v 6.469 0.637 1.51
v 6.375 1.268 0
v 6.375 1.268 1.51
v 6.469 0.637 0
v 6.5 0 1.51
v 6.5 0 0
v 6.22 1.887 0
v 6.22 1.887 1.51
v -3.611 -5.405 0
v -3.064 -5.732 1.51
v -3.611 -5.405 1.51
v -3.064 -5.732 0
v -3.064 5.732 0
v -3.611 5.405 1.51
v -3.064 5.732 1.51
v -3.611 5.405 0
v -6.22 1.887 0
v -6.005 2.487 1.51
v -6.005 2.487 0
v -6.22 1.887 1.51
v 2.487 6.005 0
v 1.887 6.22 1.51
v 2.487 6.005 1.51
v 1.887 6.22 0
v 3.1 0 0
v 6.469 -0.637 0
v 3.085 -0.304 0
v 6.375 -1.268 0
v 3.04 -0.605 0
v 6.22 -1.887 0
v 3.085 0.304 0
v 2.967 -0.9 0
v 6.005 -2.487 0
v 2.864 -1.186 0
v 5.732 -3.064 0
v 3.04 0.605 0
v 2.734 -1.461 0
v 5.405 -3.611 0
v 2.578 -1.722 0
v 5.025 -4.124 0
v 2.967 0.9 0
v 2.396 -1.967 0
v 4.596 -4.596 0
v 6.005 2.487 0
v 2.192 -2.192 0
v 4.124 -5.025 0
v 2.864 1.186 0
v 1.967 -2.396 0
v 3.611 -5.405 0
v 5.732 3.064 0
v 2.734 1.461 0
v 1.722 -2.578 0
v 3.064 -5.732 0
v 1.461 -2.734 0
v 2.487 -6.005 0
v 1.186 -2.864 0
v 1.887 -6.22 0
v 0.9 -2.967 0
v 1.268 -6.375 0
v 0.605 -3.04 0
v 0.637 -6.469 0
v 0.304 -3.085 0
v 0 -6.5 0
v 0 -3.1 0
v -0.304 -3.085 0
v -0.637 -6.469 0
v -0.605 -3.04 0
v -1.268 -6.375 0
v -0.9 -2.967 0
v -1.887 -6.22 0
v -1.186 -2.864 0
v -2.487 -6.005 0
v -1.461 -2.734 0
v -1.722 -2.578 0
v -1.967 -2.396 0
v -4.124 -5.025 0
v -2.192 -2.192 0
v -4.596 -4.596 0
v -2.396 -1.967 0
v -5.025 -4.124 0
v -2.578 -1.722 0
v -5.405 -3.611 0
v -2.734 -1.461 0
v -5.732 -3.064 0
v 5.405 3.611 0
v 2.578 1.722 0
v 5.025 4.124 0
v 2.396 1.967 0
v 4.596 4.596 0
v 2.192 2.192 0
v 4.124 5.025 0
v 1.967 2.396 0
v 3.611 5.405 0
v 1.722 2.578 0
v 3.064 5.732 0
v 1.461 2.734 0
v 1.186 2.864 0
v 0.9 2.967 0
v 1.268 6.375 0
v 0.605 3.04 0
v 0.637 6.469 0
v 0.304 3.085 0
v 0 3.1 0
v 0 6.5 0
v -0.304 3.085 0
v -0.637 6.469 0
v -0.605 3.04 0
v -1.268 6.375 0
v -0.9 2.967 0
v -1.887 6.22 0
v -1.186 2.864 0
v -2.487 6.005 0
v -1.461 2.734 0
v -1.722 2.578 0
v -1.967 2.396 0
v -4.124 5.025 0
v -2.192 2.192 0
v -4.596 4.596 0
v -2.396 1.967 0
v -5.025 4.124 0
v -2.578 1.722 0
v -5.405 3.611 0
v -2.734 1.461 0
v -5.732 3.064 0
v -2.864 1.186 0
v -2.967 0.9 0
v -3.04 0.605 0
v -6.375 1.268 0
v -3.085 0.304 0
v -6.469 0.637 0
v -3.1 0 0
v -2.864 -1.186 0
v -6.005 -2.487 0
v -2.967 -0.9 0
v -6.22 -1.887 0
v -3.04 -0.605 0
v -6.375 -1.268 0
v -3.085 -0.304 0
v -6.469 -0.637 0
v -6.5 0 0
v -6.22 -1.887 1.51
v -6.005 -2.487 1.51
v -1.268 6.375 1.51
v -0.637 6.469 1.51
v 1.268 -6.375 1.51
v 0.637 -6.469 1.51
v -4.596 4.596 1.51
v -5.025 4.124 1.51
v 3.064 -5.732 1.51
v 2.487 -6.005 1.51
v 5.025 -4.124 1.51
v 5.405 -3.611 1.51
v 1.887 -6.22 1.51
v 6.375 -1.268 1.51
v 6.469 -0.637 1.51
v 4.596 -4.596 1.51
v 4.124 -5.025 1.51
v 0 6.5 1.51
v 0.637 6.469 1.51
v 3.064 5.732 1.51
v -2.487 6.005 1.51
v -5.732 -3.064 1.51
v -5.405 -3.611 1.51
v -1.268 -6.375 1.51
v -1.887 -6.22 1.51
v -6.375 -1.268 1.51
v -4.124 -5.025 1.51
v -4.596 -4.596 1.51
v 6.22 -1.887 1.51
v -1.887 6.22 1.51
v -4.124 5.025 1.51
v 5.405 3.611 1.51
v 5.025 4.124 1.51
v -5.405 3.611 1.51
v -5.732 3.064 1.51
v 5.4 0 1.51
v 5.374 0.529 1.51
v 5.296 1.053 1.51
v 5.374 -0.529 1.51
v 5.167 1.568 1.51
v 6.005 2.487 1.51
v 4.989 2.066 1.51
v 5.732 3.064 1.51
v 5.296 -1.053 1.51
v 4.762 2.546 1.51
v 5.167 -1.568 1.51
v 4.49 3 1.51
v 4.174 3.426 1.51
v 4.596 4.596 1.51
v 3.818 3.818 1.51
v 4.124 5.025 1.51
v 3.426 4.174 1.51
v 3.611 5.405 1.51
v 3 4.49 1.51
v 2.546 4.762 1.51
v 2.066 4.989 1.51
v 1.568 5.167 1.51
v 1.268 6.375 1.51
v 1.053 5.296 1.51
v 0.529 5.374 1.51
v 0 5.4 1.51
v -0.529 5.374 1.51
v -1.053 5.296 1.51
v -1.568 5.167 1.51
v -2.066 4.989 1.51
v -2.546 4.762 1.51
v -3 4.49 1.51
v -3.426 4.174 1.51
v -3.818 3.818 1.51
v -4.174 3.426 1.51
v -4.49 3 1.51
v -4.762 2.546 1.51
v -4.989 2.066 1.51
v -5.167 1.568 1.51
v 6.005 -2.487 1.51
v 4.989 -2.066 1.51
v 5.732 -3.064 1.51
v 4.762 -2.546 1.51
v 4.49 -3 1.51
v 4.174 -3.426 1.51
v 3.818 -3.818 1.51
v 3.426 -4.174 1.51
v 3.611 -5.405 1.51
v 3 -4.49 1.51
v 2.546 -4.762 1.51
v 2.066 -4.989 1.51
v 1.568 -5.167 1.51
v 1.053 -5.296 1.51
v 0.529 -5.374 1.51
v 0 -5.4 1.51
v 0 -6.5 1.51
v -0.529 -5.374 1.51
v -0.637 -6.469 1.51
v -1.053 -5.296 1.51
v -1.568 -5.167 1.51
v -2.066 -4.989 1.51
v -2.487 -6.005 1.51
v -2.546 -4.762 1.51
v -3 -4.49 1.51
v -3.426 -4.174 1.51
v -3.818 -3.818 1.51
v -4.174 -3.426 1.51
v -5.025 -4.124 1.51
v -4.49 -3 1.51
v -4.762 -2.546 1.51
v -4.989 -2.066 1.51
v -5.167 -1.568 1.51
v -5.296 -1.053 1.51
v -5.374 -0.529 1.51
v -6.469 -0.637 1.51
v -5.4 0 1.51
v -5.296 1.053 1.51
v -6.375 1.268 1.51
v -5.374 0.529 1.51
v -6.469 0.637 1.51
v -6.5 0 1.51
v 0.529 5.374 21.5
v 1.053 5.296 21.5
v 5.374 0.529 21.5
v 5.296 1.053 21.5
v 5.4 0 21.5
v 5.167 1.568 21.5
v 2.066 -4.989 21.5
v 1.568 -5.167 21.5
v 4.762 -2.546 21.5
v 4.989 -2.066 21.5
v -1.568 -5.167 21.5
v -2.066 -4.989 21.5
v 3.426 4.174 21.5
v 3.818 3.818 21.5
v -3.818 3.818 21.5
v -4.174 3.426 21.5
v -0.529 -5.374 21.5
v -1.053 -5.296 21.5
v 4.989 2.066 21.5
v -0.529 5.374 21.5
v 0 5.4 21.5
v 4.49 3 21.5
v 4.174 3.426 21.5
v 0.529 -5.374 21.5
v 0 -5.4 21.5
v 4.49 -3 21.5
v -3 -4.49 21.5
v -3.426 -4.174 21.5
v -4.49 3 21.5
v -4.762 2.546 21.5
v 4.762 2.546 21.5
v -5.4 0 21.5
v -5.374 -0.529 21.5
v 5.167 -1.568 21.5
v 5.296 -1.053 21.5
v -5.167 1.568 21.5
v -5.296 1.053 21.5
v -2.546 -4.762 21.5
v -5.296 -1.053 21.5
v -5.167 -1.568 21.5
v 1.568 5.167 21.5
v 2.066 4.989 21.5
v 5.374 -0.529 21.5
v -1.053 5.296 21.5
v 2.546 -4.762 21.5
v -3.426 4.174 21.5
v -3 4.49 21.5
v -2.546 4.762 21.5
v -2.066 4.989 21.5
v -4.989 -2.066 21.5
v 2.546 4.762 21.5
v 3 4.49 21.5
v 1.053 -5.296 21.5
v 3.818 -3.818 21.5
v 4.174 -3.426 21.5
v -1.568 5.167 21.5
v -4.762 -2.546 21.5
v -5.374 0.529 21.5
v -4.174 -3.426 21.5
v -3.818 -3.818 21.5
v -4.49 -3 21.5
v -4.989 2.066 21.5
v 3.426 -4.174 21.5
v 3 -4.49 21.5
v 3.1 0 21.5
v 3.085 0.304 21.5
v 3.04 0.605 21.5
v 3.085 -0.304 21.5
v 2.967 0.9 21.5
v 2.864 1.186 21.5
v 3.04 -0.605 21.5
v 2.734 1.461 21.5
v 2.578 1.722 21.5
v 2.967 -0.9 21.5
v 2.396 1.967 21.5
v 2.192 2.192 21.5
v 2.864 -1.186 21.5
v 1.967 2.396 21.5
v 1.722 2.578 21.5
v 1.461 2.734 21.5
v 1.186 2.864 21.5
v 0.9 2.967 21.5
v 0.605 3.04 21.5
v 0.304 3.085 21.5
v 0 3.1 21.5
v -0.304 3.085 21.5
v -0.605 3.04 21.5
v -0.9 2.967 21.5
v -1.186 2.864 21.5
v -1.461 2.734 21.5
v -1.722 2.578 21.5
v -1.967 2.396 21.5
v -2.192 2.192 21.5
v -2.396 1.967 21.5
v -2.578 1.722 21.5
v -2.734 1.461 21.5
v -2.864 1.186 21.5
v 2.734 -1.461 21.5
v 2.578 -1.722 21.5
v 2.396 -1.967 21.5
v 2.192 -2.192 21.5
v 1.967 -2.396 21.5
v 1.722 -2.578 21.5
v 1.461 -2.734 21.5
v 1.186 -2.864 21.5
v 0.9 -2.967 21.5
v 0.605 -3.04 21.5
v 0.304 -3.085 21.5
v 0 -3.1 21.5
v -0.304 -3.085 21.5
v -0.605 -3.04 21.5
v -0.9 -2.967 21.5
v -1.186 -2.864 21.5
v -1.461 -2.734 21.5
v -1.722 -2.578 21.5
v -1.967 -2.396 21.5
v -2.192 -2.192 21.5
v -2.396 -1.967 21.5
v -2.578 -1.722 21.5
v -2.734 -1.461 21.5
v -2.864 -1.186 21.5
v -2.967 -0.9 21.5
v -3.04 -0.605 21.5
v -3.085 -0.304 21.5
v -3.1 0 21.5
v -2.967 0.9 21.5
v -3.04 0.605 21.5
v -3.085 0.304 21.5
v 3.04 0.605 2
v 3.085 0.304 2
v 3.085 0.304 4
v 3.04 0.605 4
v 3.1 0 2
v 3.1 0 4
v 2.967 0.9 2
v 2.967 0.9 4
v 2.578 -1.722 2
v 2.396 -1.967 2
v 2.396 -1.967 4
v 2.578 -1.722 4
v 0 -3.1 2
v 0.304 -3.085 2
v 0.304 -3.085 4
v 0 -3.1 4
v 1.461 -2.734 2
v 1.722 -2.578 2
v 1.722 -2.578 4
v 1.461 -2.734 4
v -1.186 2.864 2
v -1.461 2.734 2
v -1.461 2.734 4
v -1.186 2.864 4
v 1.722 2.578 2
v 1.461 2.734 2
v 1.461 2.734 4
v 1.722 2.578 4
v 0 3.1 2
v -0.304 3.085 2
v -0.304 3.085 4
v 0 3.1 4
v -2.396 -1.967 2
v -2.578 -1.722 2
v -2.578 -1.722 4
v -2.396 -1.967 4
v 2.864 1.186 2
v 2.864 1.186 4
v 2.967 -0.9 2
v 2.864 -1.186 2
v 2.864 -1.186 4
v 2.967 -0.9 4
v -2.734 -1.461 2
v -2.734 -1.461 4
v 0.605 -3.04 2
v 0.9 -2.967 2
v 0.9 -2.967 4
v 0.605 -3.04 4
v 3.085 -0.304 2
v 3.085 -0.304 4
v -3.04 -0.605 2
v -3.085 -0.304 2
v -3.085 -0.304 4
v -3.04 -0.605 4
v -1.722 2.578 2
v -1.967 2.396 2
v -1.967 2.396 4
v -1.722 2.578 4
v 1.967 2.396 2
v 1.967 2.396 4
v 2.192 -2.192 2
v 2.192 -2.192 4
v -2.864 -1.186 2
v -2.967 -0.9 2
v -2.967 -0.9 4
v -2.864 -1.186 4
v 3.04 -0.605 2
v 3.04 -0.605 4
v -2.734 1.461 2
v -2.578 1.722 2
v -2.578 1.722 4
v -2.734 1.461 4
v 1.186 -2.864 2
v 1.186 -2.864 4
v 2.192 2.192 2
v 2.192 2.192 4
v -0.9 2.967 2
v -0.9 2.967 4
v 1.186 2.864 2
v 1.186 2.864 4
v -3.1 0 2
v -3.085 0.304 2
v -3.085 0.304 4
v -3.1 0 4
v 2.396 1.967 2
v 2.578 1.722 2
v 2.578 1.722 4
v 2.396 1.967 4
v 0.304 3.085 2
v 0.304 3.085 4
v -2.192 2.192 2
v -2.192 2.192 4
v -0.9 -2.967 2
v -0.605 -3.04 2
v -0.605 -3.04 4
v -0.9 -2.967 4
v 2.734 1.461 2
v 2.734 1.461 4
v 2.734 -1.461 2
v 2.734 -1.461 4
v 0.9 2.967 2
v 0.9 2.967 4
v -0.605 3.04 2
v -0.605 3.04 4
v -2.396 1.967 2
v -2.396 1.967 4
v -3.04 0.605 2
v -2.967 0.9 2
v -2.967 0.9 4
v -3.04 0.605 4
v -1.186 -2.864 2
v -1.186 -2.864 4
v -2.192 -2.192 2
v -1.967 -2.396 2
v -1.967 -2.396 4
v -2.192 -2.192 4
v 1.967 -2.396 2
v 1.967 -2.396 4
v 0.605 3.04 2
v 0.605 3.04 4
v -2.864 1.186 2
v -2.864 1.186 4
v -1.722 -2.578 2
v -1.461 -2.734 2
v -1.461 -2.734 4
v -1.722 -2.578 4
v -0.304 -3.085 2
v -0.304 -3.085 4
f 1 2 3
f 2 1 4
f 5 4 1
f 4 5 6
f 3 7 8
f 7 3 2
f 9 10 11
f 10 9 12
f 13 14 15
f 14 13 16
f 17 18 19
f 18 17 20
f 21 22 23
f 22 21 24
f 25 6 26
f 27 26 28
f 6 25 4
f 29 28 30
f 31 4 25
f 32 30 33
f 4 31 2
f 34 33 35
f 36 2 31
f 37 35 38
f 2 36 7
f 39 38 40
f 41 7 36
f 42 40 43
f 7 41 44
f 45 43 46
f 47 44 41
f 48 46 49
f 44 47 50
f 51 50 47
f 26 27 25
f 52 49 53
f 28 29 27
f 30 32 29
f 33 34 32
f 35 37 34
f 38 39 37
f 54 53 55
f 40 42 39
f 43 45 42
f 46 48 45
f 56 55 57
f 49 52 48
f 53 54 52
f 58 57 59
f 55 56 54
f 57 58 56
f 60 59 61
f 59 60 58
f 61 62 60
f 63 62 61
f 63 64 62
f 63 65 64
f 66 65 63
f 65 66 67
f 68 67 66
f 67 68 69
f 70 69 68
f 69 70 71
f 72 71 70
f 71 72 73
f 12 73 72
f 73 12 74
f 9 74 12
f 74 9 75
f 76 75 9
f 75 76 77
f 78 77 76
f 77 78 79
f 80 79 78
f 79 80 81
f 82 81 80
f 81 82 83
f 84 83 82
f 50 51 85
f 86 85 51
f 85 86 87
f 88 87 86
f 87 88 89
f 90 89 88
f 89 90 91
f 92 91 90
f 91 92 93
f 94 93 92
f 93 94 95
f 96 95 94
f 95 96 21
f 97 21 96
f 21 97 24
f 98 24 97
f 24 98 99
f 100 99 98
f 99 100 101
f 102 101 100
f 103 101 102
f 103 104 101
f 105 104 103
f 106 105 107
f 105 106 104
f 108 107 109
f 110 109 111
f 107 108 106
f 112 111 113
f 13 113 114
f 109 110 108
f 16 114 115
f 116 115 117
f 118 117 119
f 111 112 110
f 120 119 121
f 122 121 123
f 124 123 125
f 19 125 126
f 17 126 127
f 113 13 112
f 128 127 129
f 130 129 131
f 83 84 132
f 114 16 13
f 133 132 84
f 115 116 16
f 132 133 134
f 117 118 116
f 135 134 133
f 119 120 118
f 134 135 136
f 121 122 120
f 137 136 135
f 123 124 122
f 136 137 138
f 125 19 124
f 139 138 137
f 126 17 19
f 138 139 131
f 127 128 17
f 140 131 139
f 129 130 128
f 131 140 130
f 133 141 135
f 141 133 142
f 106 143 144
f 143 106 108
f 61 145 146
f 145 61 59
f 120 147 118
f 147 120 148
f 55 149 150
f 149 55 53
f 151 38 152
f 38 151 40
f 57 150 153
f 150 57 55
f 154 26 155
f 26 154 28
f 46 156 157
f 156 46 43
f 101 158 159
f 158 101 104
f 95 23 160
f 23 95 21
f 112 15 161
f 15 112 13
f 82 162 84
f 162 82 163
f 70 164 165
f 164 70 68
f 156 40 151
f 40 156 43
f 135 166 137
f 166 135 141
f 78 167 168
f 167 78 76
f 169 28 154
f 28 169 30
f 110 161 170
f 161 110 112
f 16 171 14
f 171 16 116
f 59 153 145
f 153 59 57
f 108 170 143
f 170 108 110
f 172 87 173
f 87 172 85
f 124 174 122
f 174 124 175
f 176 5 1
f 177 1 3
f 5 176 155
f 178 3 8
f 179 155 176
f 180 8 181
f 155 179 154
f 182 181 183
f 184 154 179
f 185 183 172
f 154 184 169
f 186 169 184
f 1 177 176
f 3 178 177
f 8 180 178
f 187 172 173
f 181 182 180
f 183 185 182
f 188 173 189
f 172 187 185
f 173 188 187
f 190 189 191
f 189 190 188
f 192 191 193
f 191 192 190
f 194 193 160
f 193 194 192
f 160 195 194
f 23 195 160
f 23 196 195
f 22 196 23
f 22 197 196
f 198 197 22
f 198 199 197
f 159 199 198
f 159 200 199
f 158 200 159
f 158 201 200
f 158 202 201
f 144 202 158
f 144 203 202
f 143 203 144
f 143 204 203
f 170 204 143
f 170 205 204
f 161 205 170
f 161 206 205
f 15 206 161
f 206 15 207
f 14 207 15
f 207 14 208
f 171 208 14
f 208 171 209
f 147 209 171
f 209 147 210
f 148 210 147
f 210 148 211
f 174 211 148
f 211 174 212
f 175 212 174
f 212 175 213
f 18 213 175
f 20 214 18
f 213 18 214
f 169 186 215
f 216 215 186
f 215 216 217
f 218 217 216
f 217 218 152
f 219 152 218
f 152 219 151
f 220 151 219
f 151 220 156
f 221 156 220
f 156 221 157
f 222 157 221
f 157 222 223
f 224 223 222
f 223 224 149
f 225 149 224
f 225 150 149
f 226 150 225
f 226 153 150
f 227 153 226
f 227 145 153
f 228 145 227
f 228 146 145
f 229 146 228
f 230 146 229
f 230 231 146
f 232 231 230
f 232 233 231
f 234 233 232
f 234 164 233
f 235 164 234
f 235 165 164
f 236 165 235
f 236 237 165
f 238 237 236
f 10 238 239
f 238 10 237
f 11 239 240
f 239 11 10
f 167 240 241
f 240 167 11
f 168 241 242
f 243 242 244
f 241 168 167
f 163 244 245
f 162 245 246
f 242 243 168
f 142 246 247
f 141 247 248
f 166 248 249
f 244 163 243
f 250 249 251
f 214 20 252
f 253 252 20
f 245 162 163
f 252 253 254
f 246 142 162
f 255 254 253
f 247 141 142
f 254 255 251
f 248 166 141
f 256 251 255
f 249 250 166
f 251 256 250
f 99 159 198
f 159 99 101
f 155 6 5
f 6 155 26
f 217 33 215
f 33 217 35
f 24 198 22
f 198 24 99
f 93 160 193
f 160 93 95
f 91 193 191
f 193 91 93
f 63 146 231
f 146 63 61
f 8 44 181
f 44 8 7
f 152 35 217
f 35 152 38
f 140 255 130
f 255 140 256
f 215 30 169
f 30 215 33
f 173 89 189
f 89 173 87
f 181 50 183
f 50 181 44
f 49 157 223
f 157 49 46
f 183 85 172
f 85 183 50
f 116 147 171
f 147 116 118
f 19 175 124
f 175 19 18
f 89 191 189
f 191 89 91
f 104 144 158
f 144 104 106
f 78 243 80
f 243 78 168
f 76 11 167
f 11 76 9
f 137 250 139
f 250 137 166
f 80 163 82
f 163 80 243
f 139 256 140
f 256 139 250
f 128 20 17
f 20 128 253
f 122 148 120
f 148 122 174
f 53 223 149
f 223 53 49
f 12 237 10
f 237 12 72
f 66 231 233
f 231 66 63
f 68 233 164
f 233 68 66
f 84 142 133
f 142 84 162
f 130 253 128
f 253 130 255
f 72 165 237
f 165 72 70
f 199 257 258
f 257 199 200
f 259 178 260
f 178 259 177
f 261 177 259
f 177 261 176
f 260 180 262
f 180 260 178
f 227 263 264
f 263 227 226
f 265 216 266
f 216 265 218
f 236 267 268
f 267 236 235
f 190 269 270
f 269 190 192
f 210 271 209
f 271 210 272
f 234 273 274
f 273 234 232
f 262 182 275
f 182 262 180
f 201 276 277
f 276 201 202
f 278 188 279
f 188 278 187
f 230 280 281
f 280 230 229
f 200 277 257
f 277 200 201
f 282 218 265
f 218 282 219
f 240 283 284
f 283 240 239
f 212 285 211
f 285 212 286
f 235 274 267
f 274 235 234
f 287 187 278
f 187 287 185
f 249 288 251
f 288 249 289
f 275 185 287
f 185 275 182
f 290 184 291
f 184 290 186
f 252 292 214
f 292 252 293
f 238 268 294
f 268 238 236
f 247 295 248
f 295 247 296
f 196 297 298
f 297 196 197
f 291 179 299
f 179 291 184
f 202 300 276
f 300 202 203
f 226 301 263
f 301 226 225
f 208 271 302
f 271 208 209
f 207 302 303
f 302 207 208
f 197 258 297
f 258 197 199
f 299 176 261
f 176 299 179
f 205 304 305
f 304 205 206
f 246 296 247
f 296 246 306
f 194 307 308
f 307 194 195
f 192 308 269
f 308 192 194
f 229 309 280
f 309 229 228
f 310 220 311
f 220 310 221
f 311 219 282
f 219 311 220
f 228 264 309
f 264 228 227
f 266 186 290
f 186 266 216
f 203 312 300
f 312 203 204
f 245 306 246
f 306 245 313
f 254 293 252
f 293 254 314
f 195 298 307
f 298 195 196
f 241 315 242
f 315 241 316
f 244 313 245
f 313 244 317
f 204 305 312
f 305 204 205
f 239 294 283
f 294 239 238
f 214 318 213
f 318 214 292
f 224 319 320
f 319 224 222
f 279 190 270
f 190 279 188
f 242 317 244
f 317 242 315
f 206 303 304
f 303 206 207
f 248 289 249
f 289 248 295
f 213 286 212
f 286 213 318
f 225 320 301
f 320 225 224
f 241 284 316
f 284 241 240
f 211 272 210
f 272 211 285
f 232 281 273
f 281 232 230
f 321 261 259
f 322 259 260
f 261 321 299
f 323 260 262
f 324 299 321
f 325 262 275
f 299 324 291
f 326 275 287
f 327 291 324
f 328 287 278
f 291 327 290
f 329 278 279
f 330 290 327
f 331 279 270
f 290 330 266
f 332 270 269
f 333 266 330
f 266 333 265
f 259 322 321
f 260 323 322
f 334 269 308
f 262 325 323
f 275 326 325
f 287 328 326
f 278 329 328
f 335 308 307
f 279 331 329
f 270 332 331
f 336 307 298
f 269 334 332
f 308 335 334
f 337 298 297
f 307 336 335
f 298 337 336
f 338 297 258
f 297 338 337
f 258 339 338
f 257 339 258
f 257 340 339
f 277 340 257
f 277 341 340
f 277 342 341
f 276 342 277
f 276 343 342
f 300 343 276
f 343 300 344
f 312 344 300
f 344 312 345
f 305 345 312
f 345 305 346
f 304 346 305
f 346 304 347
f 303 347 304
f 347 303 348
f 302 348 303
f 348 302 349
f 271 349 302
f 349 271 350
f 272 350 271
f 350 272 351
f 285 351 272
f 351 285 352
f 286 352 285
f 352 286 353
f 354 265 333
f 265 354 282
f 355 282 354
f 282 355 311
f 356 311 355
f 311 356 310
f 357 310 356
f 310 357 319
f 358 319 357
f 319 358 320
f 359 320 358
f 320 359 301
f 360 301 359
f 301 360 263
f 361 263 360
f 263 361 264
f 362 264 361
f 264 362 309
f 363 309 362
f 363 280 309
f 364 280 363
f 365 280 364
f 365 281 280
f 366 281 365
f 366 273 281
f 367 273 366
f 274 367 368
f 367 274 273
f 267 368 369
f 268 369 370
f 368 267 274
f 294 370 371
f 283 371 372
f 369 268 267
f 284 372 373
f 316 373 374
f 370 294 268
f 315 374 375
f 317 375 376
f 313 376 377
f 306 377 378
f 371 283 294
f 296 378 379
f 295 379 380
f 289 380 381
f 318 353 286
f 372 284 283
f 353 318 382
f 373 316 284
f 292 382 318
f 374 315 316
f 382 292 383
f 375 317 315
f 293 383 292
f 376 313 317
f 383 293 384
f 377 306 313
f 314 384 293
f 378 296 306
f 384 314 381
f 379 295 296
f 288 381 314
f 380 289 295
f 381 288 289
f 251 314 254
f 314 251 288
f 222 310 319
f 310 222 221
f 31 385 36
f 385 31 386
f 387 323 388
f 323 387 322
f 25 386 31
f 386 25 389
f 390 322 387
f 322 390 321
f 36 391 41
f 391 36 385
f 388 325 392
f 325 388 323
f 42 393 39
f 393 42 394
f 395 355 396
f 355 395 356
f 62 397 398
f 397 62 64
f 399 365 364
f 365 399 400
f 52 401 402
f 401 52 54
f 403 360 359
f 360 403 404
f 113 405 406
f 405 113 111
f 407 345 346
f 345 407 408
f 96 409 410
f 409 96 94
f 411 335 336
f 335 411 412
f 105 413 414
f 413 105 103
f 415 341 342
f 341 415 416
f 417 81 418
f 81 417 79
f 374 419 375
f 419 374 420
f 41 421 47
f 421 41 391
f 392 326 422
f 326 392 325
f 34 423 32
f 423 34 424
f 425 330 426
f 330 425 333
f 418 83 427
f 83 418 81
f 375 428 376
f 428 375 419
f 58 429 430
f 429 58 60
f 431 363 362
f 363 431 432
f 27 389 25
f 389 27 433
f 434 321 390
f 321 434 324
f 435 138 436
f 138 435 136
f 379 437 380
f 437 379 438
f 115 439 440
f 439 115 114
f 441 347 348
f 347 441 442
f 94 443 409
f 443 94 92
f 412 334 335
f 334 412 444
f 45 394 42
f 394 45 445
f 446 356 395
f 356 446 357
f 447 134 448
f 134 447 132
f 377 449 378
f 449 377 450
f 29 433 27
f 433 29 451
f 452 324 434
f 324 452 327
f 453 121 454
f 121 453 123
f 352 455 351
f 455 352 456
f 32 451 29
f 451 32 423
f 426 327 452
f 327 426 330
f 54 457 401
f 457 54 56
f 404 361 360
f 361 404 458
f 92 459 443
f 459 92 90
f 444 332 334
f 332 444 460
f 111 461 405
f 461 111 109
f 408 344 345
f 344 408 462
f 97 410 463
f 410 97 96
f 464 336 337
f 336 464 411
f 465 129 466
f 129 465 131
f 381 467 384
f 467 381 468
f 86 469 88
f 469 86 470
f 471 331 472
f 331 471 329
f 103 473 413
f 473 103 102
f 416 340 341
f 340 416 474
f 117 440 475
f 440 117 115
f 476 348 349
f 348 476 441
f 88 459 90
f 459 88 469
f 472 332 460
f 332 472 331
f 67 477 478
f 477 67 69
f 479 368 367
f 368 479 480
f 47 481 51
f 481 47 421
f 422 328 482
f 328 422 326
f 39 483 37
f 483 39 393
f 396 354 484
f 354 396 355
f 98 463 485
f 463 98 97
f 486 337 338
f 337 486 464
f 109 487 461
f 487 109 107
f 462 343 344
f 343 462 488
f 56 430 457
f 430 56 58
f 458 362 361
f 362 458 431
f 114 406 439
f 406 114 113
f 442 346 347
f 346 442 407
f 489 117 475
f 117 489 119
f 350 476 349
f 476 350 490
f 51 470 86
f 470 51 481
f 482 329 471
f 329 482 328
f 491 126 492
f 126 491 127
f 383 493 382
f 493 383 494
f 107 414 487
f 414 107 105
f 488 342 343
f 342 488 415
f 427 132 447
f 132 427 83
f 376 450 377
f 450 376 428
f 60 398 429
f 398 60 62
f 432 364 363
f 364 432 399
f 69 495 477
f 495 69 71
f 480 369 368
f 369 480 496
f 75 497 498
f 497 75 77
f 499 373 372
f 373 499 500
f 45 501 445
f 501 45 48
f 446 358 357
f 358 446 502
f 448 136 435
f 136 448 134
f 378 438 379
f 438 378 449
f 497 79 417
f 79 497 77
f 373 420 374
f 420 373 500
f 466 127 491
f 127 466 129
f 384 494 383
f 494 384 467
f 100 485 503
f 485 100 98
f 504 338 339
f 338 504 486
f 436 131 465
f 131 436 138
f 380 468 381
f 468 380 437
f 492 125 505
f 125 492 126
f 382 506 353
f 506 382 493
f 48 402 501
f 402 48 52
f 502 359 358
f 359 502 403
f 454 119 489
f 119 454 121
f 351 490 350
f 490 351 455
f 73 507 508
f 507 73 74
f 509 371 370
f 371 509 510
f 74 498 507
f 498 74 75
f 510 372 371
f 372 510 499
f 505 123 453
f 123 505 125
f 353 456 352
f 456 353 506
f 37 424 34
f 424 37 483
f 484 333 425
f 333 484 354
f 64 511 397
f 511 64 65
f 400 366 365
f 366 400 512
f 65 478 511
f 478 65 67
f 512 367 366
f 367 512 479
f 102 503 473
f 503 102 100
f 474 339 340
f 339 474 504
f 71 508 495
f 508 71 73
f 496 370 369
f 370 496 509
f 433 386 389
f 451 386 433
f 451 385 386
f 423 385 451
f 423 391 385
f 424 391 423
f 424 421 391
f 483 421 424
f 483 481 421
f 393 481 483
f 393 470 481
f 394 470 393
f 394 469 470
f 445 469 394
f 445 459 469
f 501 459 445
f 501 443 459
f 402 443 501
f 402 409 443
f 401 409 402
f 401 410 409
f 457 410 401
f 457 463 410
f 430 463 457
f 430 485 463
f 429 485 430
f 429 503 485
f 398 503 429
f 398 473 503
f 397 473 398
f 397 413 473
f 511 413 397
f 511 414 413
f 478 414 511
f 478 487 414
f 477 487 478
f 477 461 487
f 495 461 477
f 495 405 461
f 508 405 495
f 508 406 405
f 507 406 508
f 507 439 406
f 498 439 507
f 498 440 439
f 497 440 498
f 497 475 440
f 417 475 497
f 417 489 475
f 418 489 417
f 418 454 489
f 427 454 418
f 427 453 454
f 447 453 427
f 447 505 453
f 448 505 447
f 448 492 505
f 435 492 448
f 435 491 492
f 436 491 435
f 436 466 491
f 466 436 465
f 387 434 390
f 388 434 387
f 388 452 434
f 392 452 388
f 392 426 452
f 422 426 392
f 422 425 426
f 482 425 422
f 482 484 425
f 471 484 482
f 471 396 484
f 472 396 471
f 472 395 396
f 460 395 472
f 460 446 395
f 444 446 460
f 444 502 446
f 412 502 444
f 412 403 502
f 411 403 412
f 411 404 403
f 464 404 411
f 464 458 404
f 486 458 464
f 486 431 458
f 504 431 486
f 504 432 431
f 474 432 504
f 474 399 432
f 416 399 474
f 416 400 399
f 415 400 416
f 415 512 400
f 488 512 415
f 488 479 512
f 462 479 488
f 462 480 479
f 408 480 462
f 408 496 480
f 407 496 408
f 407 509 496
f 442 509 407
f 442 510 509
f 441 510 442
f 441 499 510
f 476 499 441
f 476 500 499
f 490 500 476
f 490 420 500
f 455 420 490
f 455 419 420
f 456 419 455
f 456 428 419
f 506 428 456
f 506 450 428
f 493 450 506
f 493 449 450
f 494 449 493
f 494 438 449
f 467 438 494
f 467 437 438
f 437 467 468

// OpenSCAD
// Adapter sleeve: holds a 0.2 mL PCR tube in a 1.5 mL tube rack hole
// Category: quick fixes. Printed upside down (collar on the bed) so nothing overhangs.
// Print: PLA or PETG, 0.15 mm layers. Not for heat blocks unless printed in a
// high-temperature material (PLA softens around 55-60 C).
// SPDX-License-Identifier: CERN-OHL-P-2.0

/* [Adapter] */
collar_d = 13;         // rests on the rack surface
collar_h = 1.5;
body_d = 10.8;         // fits a 1.5 mL rack hole
body_h = 20;           // from the collar up
bore_d = 6.2;          // 0.2 mL PCR tube

/* [Hidden] */
$fn = 64;
eps = 0.01;

union(){ translate([0,0,2]) cylinder(d=6.5,h=2);
difference() {
    union() {
        cylinder(d = collar_d, h = collar_h + eps);
        translate([0, 0, collar_h]) cylinder(d = body_d, h = body_h);
    }
    translate([0, 0, -eps]) cylinder(d = bore_d, h = collar_h + body_h + 2 * eps);
}

}
